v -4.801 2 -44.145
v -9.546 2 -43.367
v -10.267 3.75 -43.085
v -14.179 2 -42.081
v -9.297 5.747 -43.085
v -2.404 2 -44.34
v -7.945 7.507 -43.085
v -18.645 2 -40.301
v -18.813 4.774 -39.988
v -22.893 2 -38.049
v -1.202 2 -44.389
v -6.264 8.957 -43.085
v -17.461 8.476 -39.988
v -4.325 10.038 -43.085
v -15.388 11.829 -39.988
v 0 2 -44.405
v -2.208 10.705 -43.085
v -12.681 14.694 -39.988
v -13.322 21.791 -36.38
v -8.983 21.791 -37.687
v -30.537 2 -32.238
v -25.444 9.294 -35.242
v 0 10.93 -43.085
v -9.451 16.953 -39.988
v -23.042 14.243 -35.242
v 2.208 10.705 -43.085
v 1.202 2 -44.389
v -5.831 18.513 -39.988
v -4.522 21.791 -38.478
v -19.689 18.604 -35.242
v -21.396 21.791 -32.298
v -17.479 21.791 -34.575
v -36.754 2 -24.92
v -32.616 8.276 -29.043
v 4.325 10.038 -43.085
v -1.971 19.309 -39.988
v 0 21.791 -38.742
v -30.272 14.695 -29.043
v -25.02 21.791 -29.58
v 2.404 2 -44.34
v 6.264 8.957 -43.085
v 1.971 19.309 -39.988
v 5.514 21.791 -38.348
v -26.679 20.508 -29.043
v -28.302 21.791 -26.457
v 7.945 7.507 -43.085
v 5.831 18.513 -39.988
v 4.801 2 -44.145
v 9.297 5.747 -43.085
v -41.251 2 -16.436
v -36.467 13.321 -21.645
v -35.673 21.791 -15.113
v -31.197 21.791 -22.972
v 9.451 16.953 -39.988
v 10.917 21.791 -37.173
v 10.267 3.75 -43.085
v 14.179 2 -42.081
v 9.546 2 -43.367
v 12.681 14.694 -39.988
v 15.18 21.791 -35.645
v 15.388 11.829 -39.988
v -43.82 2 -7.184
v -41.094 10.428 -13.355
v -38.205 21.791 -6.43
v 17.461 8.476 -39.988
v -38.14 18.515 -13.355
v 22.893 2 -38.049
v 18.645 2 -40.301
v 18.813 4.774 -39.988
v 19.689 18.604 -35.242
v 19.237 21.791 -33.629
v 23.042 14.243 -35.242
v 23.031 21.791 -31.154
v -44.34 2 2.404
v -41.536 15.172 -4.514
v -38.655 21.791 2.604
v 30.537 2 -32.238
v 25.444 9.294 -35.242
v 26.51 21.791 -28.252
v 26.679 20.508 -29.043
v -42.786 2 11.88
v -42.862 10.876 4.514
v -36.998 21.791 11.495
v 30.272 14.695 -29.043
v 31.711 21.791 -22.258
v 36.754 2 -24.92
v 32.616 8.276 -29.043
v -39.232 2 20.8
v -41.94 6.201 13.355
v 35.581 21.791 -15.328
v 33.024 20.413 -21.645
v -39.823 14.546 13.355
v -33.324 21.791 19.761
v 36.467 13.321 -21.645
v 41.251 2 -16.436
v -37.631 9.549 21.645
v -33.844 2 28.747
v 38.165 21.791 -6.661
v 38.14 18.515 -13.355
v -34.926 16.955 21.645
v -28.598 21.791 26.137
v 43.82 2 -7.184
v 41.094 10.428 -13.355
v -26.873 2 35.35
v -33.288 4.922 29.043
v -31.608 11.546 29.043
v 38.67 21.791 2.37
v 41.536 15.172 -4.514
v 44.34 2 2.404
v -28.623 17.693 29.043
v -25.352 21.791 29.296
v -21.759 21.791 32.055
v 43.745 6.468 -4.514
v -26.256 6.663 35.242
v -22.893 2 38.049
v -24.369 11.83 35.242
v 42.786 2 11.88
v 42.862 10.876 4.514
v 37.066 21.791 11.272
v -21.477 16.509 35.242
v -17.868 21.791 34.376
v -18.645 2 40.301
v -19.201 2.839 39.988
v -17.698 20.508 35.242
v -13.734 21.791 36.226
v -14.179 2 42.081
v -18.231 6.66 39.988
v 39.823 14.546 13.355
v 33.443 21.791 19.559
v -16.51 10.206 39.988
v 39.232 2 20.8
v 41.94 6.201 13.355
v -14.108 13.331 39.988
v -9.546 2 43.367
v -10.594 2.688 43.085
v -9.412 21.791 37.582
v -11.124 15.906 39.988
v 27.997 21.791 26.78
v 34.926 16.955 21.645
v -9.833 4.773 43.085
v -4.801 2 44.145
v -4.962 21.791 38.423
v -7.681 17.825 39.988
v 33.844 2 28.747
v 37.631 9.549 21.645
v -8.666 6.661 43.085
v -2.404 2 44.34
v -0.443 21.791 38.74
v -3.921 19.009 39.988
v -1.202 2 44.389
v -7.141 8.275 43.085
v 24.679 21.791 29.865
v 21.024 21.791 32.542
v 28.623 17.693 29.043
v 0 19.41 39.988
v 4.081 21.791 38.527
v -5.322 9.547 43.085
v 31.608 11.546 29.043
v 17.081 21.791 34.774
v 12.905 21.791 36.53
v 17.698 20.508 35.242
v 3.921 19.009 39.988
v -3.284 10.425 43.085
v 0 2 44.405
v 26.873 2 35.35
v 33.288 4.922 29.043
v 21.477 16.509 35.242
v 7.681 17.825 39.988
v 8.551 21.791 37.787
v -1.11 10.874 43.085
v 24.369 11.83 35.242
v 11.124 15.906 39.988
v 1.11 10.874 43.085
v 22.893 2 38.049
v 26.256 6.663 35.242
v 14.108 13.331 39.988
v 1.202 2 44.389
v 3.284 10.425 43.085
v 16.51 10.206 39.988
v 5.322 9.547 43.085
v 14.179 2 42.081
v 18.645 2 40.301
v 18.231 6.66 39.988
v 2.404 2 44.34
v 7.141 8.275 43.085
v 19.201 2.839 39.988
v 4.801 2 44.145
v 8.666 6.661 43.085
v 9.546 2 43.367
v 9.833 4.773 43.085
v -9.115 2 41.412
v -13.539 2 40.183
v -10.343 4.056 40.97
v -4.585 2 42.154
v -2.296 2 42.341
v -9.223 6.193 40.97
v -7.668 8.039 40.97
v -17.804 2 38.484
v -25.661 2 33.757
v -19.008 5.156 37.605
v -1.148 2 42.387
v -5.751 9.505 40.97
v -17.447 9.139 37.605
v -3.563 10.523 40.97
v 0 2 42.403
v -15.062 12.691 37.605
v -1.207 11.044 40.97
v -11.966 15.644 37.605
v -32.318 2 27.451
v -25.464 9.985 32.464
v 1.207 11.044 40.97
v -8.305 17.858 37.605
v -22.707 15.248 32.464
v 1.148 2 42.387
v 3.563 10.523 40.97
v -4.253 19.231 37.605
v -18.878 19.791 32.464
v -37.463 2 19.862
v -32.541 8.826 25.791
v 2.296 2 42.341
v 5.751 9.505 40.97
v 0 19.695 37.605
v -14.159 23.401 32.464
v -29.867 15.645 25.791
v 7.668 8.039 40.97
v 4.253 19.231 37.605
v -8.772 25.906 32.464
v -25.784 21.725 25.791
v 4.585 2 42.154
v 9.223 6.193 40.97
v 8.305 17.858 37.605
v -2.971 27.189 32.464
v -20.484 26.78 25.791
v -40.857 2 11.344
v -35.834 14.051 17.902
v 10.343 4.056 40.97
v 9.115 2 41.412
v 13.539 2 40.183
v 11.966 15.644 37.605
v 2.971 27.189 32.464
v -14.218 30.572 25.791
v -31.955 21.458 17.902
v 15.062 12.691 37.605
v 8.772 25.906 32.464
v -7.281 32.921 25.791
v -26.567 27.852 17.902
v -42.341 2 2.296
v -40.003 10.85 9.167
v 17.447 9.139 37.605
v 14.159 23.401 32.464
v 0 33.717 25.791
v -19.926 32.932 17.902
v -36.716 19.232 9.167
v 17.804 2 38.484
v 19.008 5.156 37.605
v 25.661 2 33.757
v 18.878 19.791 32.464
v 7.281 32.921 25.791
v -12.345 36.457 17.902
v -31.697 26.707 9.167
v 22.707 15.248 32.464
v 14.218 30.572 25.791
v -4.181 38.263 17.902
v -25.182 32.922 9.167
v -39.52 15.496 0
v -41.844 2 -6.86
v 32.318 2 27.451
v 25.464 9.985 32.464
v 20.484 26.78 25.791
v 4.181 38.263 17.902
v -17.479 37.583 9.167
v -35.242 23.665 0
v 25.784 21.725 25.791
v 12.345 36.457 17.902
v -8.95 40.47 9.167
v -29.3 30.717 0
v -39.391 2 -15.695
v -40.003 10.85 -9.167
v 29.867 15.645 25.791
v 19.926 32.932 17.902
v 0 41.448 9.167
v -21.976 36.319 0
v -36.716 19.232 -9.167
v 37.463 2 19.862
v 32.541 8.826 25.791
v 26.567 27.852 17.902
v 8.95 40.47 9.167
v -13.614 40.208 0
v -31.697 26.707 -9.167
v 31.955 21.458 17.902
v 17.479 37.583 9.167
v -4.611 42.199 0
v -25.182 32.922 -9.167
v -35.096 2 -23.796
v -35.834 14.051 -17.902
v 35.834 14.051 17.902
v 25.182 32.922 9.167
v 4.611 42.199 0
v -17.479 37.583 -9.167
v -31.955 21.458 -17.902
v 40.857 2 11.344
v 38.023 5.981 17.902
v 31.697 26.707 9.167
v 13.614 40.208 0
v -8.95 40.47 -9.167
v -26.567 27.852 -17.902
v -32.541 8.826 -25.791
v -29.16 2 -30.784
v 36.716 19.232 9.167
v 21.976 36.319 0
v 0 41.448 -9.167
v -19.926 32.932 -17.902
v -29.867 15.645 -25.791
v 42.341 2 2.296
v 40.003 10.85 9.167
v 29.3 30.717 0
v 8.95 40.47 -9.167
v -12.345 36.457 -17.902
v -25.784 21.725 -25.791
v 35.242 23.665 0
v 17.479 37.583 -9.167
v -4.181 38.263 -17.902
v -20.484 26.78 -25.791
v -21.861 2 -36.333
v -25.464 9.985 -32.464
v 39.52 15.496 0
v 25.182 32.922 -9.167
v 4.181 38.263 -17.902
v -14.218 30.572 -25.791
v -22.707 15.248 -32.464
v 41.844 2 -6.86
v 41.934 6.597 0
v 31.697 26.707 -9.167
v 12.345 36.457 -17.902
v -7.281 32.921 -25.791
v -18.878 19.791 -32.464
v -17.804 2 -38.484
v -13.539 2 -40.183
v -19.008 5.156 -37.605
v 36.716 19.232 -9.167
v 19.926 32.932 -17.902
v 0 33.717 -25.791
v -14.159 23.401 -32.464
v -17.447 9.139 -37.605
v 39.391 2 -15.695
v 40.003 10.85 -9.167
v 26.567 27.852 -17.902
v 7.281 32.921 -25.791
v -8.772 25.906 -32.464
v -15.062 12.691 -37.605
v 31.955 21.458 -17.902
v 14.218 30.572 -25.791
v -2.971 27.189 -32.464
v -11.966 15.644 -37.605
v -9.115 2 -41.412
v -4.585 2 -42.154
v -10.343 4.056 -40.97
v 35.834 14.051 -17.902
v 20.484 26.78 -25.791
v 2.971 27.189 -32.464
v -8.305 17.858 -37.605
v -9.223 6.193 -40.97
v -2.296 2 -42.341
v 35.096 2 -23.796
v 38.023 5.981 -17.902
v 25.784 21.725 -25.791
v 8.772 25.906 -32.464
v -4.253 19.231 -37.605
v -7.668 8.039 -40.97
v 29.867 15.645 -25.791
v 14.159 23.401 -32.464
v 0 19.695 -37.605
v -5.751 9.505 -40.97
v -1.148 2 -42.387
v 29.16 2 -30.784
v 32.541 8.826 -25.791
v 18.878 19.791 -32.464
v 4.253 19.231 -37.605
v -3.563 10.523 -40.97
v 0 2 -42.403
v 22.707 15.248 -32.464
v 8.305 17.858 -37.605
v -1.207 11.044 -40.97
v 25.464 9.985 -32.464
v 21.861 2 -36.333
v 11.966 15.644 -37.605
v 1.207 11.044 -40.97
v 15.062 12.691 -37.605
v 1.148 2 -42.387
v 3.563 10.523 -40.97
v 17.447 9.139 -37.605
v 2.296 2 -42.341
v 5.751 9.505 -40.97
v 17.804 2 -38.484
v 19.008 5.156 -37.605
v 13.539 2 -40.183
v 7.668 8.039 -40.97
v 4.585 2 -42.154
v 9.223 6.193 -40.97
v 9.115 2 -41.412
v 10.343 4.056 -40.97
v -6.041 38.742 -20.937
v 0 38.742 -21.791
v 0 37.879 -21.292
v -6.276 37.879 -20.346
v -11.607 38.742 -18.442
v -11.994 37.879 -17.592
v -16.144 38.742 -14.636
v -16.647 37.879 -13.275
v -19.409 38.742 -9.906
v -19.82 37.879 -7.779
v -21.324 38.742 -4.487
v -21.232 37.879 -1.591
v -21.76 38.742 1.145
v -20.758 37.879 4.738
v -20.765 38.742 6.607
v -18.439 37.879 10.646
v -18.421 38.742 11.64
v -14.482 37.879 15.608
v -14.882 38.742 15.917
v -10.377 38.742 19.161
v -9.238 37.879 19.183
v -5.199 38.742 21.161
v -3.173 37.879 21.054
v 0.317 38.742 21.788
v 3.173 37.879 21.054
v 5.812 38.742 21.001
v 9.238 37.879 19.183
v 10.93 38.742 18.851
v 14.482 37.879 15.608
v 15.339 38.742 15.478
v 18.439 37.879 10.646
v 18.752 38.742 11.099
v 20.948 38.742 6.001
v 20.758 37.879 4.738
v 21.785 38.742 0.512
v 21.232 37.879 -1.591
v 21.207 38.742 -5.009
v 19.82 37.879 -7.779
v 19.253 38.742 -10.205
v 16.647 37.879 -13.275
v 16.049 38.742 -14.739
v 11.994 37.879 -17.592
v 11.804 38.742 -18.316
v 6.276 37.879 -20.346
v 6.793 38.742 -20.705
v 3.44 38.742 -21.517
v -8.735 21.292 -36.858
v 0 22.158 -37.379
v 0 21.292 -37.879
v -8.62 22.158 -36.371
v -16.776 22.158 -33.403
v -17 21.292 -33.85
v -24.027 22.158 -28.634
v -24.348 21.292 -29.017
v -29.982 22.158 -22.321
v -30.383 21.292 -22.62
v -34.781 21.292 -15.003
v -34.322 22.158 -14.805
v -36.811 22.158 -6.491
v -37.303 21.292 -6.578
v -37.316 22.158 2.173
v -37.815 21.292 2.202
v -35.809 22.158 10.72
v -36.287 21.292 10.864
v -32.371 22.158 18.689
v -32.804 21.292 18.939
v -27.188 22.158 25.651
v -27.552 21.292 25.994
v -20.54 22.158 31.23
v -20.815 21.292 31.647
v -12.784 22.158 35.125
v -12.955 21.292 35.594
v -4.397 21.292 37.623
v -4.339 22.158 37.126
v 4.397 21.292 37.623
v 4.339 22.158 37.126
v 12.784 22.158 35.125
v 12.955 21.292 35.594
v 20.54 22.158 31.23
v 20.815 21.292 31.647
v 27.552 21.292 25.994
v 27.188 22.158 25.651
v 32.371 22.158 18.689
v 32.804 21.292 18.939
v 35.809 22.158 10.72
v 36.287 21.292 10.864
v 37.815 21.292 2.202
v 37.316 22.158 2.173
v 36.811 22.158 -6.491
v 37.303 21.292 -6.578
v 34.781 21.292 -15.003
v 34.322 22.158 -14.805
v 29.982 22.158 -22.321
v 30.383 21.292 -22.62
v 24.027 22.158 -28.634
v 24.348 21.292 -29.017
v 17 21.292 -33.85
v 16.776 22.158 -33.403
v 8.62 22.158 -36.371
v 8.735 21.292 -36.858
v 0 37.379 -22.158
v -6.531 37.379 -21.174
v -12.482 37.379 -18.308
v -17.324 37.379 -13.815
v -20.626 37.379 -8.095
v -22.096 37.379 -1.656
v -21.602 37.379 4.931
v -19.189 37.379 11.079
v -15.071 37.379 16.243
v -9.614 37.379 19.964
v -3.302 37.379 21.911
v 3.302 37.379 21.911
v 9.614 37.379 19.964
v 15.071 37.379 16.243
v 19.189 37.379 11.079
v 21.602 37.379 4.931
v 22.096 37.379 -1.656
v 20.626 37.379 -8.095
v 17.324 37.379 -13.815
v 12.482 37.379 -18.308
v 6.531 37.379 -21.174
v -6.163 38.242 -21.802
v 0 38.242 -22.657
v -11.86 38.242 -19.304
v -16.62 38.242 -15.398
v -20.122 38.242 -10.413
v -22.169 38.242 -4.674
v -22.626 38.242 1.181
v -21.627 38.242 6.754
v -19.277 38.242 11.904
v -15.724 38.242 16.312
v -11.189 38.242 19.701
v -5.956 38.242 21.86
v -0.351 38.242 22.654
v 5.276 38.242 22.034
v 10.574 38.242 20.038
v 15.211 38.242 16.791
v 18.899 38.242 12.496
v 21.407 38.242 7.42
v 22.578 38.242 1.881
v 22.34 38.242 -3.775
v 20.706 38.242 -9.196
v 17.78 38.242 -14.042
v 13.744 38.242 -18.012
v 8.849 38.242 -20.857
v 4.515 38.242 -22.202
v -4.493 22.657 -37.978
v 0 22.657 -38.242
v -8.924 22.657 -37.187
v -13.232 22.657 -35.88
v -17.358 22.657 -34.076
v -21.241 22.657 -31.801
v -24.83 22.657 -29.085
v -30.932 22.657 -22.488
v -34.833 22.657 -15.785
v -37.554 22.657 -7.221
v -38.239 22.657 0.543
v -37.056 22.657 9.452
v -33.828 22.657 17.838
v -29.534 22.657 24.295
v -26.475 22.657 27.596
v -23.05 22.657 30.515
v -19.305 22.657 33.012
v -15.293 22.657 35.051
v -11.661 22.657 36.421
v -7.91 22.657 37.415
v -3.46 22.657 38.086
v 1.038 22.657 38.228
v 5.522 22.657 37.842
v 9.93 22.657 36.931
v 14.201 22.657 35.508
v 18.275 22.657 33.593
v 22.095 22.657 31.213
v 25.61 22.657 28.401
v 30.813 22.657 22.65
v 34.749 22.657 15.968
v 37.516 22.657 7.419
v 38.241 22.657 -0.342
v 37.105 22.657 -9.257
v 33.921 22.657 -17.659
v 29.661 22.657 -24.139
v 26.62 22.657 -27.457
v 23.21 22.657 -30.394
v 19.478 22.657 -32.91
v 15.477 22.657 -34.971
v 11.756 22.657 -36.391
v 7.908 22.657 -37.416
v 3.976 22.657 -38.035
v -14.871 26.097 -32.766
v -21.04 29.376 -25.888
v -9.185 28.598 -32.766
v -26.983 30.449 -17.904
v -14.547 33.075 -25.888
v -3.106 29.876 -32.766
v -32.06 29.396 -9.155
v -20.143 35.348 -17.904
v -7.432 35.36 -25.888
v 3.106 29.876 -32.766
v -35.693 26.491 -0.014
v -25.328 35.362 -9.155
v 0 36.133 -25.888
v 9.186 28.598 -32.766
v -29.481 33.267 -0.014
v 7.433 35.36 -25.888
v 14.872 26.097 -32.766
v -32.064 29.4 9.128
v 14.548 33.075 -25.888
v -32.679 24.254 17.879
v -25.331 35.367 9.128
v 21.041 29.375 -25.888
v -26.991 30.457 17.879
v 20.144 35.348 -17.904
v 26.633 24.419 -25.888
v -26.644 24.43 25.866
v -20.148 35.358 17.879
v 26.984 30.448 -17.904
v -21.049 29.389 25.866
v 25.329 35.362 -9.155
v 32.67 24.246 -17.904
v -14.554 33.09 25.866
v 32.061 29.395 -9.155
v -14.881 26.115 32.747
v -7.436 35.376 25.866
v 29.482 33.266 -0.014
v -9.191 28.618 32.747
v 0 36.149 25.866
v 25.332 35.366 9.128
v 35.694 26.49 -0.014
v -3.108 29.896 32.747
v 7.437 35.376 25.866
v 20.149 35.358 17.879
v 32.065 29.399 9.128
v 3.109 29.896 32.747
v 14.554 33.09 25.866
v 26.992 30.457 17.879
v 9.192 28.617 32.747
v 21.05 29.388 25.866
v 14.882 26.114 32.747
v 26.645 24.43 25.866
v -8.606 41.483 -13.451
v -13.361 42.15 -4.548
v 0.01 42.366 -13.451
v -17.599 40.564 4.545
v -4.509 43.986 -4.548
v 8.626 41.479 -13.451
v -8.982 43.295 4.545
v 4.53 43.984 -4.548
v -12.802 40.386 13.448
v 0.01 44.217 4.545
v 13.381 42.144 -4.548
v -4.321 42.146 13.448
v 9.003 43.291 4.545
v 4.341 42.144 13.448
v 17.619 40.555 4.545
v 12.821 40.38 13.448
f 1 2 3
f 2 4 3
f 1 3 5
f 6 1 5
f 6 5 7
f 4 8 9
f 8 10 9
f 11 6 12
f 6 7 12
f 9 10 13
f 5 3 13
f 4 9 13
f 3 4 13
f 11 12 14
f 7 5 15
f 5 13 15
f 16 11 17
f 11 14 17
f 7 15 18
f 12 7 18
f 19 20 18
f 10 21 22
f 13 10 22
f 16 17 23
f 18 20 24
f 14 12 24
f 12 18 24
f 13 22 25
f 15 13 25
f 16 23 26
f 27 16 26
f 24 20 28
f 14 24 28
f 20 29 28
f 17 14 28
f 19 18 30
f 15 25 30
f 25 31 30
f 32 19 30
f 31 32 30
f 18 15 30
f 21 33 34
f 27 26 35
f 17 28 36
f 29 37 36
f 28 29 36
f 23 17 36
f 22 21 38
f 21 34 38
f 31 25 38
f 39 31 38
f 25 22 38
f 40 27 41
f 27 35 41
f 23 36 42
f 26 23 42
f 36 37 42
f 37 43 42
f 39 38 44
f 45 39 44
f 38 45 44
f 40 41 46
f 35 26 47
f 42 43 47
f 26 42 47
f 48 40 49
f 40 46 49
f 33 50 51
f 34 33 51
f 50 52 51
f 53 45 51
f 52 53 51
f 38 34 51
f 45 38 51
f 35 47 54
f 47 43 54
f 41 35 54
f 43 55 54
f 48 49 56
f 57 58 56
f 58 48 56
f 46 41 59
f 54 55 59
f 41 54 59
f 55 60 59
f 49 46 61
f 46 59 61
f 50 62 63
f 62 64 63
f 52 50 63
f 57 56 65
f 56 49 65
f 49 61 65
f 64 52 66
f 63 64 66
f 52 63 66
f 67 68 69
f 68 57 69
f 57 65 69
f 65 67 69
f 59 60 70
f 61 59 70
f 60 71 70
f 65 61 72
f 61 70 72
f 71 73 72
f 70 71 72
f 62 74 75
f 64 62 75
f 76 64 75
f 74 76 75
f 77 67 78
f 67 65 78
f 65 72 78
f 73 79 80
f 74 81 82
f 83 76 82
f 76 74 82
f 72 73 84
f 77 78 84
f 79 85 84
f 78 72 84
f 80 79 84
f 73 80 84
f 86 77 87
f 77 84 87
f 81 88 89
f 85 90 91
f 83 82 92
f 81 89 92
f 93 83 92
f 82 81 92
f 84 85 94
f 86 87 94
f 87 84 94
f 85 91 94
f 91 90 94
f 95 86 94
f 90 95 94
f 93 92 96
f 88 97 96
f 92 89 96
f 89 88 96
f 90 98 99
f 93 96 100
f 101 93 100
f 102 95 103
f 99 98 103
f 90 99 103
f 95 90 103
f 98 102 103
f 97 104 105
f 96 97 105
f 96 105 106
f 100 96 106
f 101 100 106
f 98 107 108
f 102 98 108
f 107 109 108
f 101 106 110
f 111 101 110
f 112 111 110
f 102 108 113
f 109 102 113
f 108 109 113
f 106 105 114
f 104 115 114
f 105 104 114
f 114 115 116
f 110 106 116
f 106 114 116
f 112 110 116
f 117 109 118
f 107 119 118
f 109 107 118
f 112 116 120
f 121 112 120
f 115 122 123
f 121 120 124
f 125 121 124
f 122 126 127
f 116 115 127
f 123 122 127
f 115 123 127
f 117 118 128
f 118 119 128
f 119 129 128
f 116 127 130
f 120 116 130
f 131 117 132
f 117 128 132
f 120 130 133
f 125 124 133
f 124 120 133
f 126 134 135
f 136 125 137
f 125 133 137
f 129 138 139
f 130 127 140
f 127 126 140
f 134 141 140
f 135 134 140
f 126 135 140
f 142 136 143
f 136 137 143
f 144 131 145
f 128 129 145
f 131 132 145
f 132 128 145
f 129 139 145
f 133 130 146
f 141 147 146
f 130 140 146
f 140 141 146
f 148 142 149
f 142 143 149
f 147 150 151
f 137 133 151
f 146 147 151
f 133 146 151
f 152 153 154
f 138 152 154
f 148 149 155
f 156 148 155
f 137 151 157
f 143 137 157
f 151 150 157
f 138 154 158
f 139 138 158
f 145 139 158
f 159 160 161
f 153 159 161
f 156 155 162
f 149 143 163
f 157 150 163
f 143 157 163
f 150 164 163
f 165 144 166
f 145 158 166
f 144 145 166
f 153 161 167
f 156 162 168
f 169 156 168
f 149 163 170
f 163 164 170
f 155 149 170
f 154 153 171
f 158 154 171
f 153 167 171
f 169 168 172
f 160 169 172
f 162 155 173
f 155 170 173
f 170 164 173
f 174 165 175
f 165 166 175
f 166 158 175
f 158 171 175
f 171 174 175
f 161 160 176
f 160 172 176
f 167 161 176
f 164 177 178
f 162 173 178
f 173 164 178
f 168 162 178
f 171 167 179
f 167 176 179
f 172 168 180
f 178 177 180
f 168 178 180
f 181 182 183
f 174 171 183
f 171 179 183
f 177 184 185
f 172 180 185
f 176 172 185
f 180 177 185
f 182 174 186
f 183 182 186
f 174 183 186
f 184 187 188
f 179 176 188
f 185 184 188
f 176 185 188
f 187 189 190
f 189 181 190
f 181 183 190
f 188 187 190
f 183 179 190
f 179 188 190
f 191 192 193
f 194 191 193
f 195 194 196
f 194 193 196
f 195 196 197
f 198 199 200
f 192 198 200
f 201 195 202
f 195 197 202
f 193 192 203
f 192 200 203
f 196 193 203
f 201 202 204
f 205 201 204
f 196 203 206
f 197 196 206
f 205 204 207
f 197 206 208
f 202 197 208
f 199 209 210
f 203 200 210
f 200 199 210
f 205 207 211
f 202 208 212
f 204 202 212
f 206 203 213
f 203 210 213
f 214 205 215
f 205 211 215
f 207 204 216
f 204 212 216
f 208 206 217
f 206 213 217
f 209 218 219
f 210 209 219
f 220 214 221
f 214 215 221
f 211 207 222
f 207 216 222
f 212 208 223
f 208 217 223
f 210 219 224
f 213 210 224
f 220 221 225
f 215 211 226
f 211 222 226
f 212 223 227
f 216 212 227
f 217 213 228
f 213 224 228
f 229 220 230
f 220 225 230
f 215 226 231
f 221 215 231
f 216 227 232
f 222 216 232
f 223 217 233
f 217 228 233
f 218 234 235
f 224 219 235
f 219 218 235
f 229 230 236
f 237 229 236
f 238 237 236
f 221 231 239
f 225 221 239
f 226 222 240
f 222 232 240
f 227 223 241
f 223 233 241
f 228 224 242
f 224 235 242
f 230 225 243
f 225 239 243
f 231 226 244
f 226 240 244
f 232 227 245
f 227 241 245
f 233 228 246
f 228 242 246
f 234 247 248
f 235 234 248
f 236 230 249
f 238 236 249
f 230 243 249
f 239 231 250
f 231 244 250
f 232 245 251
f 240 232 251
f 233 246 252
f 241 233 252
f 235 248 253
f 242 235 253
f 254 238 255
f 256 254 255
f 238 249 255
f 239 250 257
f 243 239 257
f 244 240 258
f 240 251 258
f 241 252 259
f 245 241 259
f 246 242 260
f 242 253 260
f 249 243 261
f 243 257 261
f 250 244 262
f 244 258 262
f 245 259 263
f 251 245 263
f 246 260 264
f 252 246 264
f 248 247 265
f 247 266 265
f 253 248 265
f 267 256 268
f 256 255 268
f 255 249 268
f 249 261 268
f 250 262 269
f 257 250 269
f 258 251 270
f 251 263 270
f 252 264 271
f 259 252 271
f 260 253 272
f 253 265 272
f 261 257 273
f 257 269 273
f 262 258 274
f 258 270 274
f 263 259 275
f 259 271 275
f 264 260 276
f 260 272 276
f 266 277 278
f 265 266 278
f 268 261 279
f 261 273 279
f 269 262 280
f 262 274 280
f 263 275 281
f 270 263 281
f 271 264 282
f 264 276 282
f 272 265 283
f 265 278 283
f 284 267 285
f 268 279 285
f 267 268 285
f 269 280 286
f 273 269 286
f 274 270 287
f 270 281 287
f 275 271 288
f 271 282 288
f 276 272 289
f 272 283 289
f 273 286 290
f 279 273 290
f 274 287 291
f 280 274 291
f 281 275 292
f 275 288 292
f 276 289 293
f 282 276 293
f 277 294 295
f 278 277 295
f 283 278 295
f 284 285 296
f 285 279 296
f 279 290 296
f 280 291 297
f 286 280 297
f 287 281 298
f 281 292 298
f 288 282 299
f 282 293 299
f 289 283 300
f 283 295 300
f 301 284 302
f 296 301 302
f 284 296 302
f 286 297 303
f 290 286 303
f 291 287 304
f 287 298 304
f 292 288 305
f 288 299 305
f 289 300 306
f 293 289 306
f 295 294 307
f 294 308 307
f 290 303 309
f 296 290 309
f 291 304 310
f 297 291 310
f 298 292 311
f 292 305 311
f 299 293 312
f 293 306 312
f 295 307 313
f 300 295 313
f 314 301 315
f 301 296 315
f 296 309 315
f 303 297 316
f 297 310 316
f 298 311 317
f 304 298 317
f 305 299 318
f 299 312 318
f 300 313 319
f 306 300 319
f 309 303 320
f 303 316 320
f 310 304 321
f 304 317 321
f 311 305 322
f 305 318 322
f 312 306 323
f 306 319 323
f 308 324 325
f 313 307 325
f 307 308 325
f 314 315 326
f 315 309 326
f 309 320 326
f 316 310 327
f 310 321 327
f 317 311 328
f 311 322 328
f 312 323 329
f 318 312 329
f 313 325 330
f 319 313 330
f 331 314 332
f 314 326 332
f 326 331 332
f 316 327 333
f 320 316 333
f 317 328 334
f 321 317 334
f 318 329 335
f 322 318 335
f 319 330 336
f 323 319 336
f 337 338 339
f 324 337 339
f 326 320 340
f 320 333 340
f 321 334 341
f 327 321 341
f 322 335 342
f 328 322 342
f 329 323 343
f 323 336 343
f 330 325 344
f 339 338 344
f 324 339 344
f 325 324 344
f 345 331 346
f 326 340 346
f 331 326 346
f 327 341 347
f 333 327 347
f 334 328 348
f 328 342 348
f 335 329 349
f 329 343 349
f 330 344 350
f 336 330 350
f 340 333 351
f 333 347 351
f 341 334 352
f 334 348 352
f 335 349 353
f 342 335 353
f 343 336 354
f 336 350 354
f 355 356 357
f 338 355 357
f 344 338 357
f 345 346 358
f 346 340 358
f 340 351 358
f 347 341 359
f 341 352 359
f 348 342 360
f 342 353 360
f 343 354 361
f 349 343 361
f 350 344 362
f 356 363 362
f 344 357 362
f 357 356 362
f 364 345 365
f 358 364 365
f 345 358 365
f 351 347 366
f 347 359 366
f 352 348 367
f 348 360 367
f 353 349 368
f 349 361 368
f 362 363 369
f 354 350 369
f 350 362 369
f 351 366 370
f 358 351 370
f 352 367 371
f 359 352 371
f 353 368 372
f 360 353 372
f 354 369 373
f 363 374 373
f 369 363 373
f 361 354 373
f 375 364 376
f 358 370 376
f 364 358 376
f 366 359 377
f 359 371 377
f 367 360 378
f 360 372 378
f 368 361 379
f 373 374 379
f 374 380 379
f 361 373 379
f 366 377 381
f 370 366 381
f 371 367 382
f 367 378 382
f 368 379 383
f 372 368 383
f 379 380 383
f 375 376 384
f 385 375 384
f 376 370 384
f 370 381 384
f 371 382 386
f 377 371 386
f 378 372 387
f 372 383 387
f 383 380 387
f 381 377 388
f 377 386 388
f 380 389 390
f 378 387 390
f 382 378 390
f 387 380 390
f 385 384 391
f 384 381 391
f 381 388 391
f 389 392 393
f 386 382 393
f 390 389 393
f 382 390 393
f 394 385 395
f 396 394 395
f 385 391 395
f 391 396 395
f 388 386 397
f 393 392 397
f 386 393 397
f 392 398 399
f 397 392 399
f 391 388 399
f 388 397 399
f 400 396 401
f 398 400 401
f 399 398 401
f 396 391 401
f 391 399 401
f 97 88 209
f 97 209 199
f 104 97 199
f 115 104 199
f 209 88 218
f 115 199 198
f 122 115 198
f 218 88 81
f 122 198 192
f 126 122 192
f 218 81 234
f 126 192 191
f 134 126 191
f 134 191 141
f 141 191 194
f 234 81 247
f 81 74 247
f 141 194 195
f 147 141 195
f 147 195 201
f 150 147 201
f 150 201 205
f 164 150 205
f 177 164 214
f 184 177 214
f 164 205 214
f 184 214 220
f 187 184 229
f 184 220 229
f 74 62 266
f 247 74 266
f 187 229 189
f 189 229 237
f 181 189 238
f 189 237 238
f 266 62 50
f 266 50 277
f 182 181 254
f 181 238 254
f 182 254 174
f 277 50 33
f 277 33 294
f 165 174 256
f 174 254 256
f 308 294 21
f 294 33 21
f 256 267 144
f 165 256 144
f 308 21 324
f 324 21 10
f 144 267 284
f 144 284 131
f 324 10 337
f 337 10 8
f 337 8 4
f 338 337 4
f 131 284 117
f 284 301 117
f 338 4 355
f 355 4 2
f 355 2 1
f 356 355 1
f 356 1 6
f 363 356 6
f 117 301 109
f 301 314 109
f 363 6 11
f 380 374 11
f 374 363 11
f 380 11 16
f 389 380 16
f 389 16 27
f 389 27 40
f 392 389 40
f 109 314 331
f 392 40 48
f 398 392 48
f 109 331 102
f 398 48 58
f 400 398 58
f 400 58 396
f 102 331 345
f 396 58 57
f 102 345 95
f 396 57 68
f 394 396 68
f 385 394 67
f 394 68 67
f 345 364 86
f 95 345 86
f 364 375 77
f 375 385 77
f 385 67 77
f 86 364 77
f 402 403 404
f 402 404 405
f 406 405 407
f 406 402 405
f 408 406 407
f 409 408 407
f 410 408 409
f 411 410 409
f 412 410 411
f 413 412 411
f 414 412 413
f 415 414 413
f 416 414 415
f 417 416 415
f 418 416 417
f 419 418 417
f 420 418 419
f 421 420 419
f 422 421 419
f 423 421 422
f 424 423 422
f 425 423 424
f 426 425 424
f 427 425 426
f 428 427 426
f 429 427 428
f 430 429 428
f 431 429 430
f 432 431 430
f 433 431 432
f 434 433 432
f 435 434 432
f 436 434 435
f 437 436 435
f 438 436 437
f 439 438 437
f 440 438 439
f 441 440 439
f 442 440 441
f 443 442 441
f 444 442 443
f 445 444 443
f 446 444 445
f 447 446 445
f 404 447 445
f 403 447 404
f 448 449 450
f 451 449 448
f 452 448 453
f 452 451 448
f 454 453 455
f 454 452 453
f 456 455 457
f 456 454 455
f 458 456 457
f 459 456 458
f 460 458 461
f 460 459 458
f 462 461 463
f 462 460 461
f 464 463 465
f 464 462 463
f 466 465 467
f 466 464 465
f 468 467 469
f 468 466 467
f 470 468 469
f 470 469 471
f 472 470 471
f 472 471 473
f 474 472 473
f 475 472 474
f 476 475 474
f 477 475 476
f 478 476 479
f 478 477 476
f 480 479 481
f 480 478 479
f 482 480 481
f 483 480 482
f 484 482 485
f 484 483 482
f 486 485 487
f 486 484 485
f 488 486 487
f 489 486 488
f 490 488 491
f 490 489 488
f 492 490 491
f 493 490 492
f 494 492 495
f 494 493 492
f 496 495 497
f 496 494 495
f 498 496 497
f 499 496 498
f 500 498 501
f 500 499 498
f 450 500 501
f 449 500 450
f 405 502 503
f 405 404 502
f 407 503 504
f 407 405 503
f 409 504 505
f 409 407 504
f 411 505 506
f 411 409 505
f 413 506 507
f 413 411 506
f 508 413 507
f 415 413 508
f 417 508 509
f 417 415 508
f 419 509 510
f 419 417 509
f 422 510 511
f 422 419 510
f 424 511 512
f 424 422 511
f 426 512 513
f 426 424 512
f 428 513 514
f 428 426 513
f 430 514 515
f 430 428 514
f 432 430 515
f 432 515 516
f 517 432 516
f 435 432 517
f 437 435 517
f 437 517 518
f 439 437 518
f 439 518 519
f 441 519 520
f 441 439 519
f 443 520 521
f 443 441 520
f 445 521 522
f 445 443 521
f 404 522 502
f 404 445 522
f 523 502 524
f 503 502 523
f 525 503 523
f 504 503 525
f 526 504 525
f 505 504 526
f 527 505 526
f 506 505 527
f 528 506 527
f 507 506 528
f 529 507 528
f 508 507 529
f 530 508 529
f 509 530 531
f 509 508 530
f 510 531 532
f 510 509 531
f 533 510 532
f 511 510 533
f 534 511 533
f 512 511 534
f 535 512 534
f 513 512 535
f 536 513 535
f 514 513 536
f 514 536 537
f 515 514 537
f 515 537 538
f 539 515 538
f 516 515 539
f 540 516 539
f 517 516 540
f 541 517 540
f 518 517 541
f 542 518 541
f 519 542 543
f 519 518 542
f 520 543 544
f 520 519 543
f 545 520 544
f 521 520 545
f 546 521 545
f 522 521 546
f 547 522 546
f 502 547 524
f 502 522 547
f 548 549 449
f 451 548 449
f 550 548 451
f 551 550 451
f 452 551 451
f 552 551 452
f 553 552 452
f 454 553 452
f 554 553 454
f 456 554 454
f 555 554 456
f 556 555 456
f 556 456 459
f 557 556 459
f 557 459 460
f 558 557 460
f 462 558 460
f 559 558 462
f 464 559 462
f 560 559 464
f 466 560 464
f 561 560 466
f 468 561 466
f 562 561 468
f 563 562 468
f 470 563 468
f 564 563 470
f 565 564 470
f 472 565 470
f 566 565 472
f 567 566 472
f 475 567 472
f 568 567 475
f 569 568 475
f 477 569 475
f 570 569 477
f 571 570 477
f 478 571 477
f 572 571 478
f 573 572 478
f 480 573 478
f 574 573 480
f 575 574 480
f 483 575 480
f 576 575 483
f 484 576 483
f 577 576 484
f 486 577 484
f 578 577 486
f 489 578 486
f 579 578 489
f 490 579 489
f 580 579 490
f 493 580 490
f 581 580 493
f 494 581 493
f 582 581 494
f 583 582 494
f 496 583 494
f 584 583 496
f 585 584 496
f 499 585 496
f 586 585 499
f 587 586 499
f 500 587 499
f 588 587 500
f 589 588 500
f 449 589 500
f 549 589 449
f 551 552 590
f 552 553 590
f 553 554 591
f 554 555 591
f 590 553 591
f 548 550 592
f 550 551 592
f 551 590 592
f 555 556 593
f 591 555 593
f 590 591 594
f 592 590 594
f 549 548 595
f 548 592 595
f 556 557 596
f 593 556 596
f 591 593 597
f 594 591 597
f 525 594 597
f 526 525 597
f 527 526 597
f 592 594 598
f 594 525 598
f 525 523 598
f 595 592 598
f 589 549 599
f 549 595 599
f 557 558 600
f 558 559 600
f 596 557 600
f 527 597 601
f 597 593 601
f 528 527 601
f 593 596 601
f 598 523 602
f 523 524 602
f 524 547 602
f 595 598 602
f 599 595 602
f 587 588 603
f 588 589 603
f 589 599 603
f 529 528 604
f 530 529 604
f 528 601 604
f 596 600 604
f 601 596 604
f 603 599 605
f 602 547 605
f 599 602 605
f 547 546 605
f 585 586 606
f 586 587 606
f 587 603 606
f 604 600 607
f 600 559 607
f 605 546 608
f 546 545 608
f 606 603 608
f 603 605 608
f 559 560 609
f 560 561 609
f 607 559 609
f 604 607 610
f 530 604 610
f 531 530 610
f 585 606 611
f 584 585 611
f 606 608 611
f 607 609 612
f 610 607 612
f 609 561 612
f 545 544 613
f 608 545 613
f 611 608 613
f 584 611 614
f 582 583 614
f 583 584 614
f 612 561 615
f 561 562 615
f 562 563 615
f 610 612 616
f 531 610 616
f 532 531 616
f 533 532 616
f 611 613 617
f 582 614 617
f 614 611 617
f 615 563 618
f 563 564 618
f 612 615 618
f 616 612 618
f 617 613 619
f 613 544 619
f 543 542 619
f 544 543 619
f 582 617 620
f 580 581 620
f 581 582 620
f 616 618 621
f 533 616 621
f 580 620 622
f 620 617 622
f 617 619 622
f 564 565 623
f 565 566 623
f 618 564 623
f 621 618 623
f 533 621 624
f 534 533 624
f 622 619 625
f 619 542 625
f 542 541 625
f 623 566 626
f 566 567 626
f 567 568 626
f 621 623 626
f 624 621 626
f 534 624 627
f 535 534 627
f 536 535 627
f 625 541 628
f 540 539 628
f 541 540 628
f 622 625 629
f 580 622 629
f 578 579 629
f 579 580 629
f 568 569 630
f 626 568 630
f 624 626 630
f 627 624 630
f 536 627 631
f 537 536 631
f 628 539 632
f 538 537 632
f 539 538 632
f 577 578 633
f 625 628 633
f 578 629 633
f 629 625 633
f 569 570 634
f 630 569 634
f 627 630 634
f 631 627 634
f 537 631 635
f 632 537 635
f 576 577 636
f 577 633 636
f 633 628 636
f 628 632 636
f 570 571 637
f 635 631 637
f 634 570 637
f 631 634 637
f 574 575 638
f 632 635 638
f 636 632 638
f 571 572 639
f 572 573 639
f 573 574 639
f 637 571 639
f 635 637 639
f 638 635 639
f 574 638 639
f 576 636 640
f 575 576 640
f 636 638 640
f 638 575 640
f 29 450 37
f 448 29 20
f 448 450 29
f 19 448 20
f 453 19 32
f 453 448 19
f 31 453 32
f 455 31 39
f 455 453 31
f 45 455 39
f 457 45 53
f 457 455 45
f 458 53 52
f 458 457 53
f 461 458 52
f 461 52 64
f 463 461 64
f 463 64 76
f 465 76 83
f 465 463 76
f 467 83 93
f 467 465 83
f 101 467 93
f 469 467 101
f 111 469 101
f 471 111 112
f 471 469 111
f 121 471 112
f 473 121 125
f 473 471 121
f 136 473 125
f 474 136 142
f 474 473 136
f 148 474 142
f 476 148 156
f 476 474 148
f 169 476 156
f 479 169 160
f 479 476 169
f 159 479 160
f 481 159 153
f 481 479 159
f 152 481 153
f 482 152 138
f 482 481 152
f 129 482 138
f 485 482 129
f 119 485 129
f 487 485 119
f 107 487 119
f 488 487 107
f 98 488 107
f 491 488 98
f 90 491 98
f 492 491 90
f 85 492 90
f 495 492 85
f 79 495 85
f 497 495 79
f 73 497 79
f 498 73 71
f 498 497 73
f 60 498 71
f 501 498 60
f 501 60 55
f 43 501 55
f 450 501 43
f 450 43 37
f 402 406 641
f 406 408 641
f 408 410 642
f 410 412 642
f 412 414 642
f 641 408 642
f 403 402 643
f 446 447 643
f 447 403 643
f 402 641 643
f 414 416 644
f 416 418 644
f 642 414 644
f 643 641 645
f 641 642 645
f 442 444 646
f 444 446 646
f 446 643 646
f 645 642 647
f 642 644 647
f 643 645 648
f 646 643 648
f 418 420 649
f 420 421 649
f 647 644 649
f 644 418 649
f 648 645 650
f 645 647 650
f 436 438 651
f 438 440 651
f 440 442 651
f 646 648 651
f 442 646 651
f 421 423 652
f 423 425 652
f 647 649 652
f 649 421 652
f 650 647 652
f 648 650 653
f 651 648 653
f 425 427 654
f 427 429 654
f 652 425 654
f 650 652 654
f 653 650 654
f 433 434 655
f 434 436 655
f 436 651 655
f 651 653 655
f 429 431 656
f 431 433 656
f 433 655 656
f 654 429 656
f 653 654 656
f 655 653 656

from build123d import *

# Parameters (mm, degrees)
REVOLVE1_ANGLE     = 180
SKETCH2_R          = 44.45
CUT_EXTRUDE1_DEPTH = 2
F_30DEG_W          = 1
F_30DEG_H          = 1


with BuildPart() as part:
    # Sketch1 → Revolve1 (revolve)
    with BuildSketch(Plane(origin=(0, 0, 0), x_dir=(1, 0, 0), z_dir=(0, 1, 0))):
        with BuildLine():
            ThreePointArc((0, 44.45), (-44.45, 0), (0, -44.45))
            Line((0, -44.45), (0, -42.45))
            ThreePointArc((0, -42.45), (-42.45, 0), (0, 42.45))
            Line((0, 42.45), (0, 44.45))
        make_face()
    revolve(axis=Axis((0, 0, 44.45), (0, 0, -1)), revolution_arc=REVOLVE1_ANGLE)

    # Sketch2 → Cut-Extrude1 (cut)
    with BuildSketch(Plane(origin=(0, 0, 0), x_dir=(1, 0, 0), z_dir=(0, 1, 0))):
        Circle(SKETCH2_R)
    extrude(amount=CUT_EXTRUDE1_DEPTH, mode=Mode.SUBTRACT)

    # 30deg → Cut-Revolve1 (revolve, cut)
    with BuildSketch(Plane(origin=(0, 0, 0), x_dir=(0, 0, -1), z_dir=(1, 0, 0))):
        with Locations((43.95, 0)):
            Rectangle(F_30DEG_W, F_30DEG_H)
        Polygon((38.244829198, 22.658012702), (38.744829198, 21.791987298), (37.878803794, 21.291987298), (37.378803794, 22.158012702), align=None)
        Polygon((21.791987298, 38.744829198), (22.658012702, 38.244829198), (22.158012702, 37.378803794), (21.291987298, 37.878803794), align=None)
    revolve(axis=Axis((0, -1000, 0), (0, 1, 0)), mode=Mode.SUBTRACT)


solid = part.part
